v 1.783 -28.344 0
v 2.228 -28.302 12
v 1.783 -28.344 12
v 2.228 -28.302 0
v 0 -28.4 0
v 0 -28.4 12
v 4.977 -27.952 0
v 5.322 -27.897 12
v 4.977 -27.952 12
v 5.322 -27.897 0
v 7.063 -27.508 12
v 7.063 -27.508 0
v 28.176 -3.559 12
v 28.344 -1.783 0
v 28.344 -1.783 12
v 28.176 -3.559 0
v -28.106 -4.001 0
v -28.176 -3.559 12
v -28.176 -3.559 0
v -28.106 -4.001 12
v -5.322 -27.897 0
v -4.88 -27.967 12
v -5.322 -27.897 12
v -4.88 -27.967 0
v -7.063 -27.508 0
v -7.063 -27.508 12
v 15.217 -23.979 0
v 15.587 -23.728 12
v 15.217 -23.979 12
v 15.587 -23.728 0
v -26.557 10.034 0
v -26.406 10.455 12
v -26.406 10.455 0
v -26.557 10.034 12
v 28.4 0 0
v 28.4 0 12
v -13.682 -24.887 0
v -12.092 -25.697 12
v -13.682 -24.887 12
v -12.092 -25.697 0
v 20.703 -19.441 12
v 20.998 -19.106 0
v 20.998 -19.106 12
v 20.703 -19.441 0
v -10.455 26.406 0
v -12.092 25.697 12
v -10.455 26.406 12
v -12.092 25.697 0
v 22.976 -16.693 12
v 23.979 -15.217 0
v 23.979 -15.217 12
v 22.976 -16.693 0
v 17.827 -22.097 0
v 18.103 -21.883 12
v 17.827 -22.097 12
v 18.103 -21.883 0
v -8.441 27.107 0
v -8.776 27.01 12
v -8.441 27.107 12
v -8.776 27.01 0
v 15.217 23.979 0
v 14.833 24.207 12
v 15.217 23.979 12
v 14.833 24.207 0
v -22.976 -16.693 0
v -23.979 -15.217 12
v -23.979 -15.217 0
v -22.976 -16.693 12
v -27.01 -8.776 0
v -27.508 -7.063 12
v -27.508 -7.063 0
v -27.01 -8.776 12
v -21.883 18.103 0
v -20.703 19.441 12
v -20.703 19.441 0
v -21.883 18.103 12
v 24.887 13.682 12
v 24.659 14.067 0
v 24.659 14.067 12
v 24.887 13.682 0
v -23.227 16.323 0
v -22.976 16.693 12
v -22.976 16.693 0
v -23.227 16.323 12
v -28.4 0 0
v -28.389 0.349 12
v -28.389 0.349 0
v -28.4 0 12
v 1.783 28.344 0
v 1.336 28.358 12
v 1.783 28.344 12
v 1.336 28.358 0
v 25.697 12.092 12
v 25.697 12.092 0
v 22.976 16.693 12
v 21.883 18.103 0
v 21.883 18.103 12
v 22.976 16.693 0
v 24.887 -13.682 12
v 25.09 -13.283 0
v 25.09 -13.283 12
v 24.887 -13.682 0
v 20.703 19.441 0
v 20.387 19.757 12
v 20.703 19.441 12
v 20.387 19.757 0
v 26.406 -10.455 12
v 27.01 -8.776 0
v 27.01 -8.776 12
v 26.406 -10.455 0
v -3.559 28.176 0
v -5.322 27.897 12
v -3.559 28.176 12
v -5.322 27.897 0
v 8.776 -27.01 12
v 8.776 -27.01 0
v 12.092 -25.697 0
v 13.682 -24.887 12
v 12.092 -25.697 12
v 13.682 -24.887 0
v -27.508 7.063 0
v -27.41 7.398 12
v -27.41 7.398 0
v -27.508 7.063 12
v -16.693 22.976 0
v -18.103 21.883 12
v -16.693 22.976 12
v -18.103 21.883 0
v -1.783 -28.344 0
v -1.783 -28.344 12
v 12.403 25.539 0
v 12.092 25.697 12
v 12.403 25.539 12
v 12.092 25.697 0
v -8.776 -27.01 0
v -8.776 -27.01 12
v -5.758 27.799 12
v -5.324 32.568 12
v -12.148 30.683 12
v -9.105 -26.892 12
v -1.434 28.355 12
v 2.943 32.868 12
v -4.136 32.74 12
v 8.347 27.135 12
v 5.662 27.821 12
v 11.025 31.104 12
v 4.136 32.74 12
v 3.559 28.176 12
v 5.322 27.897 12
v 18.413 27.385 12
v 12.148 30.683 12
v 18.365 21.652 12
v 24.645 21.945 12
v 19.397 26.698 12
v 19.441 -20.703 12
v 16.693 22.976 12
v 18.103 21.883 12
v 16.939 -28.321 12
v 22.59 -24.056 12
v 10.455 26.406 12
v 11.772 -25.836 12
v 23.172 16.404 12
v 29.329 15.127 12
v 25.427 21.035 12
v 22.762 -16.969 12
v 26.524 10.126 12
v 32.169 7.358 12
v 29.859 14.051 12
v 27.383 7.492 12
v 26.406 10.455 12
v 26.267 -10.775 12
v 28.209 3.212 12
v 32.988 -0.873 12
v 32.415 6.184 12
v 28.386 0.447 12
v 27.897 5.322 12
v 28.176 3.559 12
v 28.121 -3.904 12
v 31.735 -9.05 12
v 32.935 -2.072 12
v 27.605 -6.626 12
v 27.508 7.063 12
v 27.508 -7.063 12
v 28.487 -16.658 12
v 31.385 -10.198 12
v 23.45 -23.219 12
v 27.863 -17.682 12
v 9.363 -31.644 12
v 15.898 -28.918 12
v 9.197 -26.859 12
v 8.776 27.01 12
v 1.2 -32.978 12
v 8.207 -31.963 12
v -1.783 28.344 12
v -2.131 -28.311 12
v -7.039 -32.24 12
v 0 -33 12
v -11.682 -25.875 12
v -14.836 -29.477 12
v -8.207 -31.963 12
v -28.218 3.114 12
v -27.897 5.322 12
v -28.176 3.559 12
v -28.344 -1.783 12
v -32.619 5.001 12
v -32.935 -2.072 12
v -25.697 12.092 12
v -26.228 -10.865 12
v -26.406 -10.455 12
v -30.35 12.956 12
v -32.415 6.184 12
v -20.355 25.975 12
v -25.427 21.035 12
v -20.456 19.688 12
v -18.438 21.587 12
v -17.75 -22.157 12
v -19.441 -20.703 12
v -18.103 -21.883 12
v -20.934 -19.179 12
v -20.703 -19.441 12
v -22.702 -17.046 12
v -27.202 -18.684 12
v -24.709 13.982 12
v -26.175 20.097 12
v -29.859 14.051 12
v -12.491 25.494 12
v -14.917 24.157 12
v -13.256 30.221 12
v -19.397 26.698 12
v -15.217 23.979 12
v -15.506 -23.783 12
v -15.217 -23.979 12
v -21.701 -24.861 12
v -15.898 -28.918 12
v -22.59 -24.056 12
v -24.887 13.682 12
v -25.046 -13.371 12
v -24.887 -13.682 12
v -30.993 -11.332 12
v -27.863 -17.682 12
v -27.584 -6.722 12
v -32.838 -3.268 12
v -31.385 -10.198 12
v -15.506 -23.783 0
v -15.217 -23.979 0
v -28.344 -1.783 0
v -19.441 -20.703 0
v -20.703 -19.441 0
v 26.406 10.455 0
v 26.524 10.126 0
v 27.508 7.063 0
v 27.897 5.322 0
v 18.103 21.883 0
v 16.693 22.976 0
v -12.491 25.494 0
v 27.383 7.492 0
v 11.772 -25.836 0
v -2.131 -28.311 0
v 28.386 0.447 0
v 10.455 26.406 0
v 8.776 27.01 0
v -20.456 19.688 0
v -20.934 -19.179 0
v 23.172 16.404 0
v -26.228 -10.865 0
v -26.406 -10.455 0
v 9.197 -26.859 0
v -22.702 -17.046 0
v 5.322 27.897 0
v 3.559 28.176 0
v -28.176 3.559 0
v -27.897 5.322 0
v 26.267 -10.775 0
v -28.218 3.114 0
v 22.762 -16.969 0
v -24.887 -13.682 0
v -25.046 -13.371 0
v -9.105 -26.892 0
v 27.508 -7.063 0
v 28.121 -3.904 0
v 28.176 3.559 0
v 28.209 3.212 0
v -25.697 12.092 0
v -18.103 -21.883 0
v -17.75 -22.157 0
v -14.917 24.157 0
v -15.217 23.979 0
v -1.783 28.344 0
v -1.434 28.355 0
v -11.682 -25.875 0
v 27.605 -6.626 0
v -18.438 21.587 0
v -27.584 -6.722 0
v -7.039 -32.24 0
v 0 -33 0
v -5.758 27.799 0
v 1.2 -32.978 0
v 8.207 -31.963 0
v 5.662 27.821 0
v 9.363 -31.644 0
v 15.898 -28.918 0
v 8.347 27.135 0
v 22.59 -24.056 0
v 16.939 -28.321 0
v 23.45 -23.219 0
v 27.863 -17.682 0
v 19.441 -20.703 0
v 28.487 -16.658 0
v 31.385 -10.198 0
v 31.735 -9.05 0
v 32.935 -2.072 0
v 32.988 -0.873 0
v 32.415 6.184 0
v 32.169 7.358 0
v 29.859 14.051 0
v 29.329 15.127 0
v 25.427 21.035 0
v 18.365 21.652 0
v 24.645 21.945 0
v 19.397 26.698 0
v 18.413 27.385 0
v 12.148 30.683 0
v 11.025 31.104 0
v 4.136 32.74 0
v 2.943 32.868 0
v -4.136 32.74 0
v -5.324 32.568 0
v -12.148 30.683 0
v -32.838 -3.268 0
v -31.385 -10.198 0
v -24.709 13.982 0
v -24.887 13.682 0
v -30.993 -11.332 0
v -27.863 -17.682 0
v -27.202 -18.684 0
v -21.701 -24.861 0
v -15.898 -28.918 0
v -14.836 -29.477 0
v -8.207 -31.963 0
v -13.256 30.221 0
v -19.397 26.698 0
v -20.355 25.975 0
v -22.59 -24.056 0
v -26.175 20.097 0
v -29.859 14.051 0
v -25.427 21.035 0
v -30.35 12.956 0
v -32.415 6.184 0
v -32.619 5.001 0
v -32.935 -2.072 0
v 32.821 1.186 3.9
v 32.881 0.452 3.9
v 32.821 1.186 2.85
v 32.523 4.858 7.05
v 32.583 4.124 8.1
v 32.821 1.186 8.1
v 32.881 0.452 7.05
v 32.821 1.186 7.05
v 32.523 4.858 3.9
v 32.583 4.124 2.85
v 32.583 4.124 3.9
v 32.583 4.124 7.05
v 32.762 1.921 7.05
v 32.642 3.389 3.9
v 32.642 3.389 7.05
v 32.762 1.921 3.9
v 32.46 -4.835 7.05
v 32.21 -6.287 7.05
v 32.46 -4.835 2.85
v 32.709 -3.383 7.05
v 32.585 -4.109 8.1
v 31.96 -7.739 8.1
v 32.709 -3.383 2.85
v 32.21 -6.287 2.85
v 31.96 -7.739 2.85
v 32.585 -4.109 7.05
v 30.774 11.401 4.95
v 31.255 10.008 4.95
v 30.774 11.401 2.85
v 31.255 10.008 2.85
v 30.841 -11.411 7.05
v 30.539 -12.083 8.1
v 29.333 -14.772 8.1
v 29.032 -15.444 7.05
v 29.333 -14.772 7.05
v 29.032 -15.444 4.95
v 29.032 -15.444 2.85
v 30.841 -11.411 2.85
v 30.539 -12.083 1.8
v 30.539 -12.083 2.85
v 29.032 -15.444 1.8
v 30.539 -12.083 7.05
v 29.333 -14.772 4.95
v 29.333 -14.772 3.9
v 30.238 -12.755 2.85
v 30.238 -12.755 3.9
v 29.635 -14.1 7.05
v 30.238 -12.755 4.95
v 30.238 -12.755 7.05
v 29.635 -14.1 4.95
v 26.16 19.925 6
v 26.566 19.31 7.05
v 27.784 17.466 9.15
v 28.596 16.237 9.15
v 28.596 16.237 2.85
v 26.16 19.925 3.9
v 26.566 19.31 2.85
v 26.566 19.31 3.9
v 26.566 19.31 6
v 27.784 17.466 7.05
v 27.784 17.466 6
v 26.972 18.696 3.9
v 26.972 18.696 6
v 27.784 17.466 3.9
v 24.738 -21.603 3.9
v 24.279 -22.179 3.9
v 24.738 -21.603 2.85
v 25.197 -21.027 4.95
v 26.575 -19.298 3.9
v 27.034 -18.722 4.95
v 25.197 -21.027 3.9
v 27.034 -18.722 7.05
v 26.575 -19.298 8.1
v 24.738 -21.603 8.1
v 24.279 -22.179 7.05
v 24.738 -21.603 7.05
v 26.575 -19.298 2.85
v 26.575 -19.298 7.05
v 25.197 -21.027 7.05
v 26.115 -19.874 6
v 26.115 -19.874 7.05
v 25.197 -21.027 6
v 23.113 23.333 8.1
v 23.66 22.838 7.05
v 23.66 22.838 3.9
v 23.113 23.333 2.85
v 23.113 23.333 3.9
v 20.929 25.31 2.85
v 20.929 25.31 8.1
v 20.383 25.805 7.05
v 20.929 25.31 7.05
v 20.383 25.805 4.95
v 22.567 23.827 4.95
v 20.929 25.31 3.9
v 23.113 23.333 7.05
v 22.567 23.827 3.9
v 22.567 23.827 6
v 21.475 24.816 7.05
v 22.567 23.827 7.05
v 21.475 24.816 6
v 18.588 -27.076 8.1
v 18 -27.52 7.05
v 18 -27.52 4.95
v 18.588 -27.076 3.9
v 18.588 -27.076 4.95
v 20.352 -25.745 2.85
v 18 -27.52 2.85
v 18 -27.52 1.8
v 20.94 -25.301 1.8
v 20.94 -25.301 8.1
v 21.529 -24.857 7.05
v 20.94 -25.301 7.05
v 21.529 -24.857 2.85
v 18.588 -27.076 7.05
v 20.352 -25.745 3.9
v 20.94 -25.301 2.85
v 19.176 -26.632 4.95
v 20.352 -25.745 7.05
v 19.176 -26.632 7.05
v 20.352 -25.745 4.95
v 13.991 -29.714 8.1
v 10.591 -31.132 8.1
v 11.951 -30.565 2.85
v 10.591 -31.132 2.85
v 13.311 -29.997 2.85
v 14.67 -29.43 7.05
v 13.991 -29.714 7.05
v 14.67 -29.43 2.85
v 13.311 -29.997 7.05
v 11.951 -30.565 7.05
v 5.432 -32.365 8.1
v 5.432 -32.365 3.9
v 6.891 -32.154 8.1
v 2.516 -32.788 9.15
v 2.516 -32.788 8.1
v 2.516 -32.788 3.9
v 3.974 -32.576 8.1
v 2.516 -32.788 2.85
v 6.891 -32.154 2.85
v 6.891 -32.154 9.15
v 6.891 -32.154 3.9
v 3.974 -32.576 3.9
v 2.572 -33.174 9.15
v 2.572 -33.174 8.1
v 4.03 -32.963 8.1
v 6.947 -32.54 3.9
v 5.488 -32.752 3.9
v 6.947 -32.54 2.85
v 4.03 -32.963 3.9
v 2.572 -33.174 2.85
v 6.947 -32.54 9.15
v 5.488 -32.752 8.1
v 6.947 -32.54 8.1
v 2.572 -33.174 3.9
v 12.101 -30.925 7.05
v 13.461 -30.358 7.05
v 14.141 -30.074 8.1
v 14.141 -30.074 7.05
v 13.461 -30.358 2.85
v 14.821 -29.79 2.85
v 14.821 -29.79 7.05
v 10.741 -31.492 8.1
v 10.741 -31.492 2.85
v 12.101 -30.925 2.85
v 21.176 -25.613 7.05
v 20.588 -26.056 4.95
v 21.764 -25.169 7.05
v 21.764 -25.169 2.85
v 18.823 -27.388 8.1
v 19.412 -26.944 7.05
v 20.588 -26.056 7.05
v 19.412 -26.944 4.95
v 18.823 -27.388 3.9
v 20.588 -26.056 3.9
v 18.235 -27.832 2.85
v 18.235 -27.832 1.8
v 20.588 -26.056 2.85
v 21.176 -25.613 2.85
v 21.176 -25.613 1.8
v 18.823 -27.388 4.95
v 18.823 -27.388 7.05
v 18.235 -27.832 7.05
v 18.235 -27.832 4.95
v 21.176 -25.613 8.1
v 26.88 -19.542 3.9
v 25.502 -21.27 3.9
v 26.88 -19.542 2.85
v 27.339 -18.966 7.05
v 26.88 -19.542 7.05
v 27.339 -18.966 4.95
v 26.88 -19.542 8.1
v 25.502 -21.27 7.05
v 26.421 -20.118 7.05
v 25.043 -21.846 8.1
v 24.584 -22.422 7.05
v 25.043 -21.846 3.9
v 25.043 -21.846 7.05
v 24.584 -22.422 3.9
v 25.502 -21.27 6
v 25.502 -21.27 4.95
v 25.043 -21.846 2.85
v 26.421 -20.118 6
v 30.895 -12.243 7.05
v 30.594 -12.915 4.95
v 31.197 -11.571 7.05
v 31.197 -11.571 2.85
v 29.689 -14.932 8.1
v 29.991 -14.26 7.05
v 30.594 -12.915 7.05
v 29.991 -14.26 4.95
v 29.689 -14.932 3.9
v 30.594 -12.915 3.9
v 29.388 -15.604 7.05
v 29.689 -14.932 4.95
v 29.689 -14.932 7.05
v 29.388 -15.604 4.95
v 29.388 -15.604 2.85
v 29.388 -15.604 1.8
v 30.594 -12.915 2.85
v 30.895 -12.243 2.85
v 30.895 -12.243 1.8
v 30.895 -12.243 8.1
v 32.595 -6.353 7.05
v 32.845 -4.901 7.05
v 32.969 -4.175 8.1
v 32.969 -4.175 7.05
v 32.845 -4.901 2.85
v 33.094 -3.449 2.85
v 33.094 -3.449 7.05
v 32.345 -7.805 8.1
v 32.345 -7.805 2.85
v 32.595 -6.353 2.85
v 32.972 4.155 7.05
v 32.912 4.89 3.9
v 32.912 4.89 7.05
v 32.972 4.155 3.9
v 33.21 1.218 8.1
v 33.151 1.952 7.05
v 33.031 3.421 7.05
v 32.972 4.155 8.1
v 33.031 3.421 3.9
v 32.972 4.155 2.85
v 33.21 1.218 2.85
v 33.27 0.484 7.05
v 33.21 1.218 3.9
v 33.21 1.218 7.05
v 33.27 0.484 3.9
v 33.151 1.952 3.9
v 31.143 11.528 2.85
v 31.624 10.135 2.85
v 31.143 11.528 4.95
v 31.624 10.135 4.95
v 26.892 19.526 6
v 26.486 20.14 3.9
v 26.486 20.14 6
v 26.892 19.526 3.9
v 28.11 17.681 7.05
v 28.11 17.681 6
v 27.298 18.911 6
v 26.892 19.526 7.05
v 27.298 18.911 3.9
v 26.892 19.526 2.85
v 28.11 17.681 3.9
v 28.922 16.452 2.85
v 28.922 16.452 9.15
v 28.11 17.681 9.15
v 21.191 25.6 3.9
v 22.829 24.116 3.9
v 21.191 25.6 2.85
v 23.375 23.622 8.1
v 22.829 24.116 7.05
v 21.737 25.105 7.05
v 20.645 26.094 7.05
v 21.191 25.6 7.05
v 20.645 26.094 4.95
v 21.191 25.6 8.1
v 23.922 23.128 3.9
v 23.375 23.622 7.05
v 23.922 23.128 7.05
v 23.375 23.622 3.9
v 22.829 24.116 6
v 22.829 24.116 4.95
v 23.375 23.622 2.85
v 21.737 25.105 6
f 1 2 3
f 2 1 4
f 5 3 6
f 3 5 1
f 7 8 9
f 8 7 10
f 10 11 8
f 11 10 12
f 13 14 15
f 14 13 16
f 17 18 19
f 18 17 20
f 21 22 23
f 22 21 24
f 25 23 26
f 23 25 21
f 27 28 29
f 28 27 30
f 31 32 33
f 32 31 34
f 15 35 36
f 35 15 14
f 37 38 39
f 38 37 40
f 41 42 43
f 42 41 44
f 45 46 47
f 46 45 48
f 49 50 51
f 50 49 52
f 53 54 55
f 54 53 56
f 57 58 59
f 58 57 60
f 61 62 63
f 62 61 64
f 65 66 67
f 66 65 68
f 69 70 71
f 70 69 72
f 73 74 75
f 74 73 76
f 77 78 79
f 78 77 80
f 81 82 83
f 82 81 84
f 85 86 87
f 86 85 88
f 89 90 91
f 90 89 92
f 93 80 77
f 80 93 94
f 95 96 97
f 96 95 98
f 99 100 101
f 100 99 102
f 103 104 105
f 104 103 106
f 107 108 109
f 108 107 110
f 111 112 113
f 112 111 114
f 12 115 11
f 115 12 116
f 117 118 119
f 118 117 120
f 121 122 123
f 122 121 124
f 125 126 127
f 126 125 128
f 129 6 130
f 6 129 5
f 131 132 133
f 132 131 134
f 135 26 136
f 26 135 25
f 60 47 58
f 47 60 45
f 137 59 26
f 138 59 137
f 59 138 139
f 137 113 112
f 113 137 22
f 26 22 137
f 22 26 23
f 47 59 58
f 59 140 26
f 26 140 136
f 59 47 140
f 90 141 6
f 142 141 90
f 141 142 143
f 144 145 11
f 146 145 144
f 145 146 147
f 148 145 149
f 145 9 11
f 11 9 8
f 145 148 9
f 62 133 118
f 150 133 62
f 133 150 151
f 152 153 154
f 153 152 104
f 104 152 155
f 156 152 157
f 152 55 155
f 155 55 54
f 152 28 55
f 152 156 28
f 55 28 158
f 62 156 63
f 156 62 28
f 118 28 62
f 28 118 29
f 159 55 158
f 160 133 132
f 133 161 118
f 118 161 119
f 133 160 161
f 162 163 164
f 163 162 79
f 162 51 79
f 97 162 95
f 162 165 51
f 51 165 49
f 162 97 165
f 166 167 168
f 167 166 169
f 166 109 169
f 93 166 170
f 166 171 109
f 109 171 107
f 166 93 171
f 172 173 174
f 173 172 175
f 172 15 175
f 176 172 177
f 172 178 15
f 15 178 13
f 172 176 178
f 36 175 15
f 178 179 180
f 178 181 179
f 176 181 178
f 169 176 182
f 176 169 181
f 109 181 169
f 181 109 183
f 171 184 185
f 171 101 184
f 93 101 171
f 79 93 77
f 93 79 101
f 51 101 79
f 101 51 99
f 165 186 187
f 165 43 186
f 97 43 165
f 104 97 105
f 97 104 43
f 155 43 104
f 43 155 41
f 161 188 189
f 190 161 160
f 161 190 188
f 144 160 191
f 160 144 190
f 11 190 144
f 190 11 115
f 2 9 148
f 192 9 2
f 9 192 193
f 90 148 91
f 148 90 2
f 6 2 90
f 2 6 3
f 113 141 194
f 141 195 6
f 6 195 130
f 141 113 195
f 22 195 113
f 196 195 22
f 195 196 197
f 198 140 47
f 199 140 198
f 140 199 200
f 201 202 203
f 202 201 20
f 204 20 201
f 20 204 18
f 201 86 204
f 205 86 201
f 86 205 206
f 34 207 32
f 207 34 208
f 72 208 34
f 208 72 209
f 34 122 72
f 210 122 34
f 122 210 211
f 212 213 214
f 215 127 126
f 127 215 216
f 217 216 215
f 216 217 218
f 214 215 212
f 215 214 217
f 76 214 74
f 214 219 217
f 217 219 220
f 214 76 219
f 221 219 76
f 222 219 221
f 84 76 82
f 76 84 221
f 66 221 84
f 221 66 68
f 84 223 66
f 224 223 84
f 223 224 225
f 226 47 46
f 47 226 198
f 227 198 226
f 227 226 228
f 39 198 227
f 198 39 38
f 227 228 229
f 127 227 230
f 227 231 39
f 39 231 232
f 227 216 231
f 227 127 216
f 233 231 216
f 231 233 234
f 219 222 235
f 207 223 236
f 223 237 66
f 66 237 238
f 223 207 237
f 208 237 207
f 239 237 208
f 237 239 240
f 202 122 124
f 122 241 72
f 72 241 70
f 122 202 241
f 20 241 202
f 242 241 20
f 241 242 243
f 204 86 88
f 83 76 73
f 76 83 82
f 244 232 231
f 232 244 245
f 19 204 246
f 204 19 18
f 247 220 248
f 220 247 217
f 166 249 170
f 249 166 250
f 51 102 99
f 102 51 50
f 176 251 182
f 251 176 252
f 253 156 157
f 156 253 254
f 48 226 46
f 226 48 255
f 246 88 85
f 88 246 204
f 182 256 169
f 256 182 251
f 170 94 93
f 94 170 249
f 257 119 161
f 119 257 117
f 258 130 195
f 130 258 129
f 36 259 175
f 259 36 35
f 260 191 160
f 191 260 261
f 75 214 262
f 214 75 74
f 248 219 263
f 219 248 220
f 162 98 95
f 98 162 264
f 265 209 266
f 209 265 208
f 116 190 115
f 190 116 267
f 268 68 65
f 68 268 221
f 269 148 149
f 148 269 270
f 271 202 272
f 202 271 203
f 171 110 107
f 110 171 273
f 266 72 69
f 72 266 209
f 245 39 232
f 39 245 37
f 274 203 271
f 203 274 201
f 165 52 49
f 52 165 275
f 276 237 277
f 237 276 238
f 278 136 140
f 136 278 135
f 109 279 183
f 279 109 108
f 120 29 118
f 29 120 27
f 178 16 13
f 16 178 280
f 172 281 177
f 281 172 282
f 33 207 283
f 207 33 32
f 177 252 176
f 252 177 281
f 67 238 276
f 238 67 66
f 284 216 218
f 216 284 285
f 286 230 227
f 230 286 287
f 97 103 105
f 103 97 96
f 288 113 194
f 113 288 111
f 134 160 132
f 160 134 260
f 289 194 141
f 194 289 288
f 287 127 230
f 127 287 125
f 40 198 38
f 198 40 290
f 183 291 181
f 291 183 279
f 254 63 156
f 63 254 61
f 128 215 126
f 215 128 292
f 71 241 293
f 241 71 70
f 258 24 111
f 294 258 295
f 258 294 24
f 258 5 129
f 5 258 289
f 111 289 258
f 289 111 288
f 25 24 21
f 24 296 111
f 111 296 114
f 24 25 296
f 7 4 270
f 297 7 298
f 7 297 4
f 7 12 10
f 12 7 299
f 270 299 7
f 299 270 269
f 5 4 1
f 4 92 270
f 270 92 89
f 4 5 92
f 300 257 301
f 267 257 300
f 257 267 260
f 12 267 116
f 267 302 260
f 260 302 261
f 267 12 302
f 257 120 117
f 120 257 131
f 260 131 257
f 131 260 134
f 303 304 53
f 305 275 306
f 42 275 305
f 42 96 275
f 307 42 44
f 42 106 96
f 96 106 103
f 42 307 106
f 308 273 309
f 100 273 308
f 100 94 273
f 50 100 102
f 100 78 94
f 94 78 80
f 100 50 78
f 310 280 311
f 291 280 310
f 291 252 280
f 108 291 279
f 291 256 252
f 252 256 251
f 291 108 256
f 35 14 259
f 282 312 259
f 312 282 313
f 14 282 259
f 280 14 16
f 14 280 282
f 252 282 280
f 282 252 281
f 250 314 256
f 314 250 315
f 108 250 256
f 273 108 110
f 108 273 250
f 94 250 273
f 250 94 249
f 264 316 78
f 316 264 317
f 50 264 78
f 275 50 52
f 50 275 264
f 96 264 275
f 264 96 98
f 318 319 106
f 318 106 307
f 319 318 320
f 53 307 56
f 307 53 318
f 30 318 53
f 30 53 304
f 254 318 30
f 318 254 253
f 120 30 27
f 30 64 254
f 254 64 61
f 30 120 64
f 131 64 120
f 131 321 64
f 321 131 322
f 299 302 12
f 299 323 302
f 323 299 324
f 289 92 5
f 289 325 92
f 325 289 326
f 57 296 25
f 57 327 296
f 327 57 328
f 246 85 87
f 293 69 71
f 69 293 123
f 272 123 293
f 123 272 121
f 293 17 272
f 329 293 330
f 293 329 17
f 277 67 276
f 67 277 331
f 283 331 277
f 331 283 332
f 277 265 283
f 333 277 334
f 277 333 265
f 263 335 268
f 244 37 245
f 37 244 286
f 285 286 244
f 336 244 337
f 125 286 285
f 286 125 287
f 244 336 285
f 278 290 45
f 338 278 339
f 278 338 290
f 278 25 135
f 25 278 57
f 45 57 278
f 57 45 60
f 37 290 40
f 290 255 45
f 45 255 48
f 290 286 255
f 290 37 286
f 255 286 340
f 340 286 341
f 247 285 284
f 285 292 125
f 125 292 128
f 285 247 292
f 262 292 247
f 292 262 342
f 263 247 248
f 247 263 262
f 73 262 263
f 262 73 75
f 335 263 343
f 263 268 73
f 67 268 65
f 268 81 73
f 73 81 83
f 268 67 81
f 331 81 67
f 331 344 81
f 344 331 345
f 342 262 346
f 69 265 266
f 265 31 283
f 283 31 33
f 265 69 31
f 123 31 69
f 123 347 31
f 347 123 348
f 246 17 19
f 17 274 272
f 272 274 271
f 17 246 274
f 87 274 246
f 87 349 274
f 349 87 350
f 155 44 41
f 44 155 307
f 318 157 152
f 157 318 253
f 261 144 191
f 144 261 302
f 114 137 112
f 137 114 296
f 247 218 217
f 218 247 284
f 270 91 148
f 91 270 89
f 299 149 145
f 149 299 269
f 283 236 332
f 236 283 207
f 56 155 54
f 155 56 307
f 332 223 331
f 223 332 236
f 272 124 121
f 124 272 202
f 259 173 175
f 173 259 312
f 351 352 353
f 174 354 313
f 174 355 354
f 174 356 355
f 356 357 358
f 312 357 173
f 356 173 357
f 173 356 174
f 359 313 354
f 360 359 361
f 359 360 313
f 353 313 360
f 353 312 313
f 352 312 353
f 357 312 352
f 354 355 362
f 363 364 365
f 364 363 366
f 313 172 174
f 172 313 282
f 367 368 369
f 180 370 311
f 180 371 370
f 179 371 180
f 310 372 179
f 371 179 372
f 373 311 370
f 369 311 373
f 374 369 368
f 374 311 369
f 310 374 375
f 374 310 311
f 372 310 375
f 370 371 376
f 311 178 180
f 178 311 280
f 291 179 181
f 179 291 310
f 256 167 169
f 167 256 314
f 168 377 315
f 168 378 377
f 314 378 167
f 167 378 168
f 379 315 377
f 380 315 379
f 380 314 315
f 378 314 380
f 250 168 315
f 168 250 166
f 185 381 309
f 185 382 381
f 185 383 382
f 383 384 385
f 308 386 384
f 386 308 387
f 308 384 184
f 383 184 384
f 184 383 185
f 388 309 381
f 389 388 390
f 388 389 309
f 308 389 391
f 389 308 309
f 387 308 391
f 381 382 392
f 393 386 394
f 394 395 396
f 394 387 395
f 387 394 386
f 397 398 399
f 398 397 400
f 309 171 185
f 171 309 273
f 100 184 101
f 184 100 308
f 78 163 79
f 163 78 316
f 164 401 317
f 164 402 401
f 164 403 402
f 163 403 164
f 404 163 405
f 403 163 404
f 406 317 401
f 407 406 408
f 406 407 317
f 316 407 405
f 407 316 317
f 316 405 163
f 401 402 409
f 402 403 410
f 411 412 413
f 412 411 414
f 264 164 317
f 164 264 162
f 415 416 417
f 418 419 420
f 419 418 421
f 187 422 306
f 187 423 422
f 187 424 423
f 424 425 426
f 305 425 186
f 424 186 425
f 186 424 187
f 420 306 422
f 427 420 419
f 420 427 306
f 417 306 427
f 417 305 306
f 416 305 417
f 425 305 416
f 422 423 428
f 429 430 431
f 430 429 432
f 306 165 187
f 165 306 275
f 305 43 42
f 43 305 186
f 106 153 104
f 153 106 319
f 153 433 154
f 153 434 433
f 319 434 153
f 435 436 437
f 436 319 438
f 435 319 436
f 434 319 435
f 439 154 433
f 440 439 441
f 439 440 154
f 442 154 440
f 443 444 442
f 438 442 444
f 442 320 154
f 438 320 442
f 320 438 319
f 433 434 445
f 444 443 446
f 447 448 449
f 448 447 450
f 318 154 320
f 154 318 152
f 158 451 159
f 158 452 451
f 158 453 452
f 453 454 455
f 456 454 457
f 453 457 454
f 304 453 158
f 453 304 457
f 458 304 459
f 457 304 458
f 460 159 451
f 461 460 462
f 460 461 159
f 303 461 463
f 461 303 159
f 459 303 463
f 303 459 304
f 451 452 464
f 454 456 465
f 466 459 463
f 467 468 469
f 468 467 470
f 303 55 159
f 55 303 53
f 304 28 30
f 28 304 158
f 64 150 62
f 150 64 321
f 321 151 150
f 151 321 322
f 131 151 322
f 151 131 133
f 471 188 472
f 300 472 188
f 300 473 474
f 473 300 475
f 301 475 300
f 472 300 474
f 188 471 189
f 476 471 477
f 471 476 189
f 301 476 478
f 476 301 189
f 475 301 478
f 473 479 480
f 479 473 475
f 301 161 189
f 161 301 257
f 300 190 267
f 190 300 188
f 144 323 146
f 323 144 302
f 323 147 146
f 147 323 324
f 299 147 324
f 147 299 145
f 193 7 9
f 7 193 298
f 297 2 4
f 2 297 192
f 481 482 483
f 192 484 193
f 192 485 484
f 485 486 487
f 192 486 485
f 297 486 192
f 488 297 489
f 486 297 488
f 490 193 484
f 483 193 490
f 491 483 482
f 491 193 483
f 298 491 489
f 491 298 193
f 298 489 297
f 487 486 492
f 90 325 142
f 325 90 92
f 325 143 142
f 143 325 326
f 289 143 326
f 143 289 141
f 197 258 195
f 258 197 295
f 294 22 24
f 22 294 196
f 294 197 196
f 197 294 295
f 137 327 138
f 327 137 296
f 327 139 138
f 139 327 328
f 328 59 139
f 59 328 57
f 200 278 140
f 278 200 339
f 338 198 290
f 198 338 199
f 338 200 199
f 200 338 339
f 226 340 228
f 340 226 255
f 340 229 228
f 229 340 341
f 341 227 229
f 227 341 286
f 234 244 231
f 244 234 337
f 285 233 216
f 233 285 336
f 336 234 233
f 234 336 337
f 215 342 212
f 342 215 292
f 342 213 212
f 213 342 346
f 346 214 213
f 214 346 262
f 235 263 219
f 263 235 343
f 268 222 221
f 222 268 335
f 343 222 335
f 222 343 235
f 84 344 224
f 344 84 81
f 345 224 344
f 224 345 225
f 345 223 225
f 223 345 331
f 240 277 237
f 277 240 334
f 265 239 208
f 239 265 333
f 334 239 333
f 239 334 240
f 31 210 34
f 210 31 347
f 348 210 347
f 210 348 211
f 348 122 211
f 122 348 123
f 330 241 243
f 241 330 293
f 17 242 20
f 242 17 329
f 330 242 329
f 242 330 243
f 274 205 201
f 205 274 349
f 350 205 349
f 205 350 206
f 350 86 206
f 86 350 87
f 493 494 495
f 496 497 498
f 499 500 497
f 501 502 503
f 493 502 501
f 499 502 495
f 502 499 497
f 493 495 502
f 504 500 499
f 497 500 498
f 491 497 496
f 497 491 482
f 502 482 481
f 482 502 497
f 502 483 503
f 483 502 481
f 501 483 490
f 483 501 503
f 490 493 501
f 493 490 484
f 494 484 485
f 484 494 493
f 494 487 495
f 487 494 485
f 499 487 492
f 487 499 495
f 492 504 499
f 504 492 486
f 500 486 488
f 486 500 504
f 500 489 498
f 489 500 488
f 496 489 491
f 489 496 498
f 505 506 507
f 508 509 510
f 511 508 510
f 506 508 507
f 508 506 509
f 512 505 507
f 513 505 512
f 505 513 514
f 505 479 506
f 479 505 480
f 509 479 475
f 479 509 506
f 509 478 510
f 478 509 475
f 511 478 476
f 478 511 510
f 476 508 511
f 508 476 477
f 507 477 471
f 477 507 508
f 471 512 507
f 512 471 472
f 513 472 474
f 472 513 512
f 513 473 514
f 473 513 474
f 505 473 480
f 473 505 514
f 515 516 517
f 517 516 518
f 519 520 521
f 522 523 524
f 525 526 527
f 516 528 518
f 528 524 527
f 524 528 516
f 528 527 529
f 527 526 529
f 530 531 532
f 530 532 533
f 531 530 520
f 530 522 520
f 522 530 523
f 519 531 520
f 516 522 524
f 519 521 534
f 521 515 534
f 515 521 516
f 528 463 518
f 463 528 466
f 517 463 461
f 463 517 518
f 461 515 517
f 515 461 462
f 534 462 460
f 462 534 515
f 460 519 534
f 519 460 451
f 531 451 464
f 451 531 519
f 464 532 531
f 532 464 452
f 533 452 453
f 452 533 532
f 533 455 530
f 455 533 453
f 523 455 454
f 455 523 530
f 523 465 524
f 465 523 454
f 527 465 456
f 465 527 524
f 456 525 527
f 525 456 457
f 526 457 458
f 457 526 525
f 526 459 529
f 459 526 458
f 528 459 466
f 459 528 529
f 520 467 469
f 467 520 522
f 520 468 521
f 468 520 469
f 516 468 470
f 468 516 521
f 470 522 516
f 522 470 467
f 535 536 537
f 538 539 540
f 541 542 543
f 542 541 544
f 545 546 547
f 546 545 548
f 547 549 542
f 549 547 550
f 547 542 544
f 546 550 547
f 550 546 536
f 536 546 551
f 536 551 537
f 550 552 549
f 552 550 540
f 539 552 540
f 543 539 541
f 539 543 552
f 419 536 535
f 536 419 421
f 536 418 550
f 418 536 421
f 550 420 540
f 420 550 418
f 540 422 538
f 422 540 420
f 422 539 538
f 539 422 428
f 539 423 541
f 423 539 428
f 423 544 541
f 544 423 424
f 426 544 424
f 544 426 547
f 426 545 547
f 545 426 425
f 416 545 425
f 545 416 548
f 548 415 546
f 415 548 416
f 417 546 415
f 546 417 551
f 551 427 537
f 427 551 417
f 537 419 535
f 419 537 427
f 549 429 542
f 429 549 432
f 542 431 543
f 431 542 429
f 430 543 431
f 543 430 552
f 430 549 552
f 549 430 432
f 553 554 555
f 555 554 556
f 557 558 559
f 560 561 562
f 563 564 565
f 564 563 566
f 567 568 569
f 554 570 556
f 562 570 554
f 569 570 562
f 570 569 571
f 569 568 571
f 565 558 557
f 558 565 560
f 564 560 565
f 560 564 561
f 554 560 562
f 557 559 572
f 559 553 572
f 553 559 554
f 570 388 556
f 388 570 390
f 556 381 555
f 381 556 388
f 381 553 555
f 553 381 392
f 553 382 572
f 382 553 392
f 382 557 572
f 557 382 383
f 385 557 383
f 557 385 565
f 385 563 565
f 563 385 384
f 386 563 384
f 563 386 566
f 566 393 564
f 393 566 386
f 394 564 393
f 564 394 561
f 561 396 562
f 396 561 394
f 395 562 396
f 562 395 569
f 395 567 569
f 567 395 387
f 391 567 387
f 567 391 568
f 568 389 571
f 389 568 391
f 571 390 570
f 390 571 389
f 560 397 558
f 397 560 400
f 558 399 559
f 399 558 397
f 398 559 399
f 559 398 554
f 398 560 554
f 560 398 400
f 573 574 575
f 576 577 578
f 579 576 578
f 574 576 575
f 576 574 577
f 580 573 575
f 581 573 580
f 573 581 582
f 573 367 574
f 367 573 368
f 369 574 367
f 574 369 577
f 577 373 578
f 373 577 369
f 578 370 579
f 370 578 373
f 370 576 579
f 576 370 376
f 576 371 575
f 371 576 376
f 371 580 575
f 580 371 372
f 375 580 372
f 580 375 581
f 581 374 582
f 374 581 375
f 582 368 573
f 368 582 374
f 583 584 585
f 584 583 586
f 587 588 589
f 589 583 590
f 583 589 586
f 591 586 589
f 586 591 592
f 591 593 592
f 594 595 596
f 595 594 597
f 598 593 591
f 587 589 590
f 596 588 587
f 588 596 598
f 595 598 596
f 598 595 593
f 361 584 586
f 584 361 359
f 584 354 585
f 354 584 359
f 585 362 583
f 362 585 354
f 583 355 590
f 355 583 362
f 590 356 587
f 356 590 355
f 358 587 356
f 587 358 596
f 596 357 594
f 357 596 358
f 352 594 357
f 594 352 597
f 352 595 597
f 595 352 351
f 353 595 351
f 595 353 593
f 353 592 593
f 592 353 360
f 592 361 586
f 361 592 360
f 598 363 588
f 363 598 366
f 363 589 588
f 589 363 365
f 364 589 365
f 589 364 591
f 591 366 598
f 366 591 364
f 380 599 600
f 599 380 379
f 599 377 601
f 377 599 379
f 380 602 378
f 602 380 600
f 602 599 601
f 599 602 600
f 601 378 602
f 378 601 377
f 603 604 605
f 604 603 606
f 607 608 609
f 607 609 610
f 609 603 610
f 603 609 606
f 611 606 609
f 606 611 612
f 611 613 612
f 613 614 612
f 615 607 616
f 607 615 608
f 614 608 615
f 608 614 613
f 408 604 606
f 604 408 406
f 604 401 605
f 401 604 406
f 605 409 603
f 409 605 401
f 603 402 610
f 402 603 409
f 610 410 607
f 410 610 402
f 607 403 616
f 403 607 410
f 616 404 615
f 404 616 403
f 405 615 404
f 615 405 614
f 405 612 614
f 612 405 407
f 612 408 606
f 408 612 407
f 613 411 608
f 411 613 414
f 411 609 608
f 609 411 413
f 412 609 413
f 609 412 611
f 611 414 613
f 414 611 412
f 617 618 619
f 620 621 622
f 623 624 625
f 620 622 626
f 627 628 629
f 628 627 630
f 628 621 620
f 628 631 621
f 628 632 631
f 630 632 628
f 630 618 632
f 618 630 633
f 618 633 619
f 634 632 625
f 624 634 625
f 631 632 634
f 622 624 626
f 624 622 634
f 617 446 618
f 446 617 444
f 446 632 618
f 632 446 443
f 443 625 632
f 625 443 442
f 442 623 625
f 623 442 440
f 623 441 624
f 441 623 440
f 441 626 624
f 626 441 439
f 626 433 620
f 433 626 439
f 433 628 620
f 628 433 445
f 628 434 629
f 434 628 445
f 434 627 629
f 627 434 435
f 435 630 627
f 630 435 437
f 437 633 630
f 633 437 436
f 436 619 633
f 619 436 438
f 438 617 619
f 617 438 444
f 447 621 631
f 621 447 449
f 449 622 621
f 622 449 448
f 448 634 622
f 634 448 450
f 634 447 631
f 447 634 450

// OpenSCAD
//inner radius of the bracelet in mm
inner_radius = 28; //[15:150]

//outer radius of the bracelet in mm
outer_radius = 33; //[15:150]

//length (=height) of the bracelet in mm
length = 12;  // [5:60]

//diameter of your 3d printer nozzle in mm. The gaps will be multiples of this
nozzle = 0.4; 

//gap inside factor. Increase to avoid touching links at inside
gapinfactor = 6; //[2:8]

//number of sections on bracelets
sections = 25; //[15:60]

//text to put on bracelet
text = "Ingegno.be";

//view text as holes?
holes = "no"; // [yes, no]

//text thickness as amount of nozzle. Don't set high as top part will not be filled with fill=0!
text_thickness = 2;  //[2:6]

use <MCAD/fonts.scad>

module test(){
  echo("test");
}

baseheight = 0.8;
r1 = inner_radius;
r2 = outer_radius;
n = sections;
gapin=gapinfactor*nozzle;
gapout = 3*nozzle;
alpha = 2*PI/sections;
alpha_1 = alpha - gapin/r1;
beta = 2*PI/sections;
beta_1 = alpha - gapout/r2;
alpha_2 = gapin/r1;
beta_2 = gapout/r2;
alpha_3 = nozzle/r1;
beta_3 = nozzle/r2;

fudge = 0.01;

//process the text, we have beta_1 for the symbol, use beta_2 for border!
thisFont=8bit_polyfont();
x_shift=thisFont[0][0];
y_shift=thisFont[0][1];
theseIndicies=search(text,thisFont[2],1,1);
wordlength = (len(theseIndicies));

factorygap = 3;
scale_x = (beta_1-beta_2) * r2 / x_shift;
scale_y = (length - factorygap*gapout) / y_shift;
thicknessword = text_thickness * nozzle;

// Create the Text
module alltext() {
    for( j=[0:(len(theseIndicies)-1)] ) 
      rotate([0, 0, (3/2*beta_2 + (beta_1-beta_2)/2 + j* beta)*180/PI]) 
      translate([r2 -1.5* nozzle, -(beta_1-beta_2) * r2 /2 , factorygap/2*gapout])
      rotate([90,0,90]) 
        {
        scale([scale_x,scale_y,1]){
          linear_extrude(height=thicknessword) 
            polygon(points=thisFont[2][theseIndicies[j]][6][0],paths=thisFont[2][theseIndicies[j]][6][1]);
        }
      }
}

module innerholes() {
  union() {
    for (i = [0:n-1]){
      rotate([0,0,(-alpha_1/2 + i* alpha)*180/PI])
        translate([r1,0,0]) 
          cube(size=[3*nozzle,r1*(alpha_2+alpha_3), 3*length], center=true);
    }
  }
}

module spikes() {
  linear_extrude(height=length) { union(){
    for (i = [0:n-1]){
      polygon(points = [ [r1*cos((-alpha_1/2 + i* alpha-alpha_2)*180/PI), 
                          r1*sin((-alpha_1/2 + i* alpha-alpha_2)*180/PI)], 
                         [r2*cos((2*beta_2/2 + (i-1)* beta)*180/PI), 
                          r2*sin((2*beta_2/2 + (i-1)* beta)*180/PI)], 
                         [r2*cos(( (i)* beta)*180/PI), 
                          r2*sin(( (i)* beta)*180/PI)], 
                         [r1*cos((-alpha_1/2 + i* alpha)*180/PI), 
                          r1*sin((-alpha_1/2 + i* alpha)*180/PI)]
                         ], 
                   paths = [ [0,1,2,3]]);
    }
  }}
}

module outerholes() {
  union() {
    for (i = [0:n-1]){
      rotate([0,0,(beta_2/2 + i* beta)*180/PI])
        translate([r2-nozzle,0,0]) 
          cube(size=[3*nozzle, gapout, 3*length], center=true);
    }
  }
}

module outercirc(){
  difference(){
    cylinder(h=length, r=r2, $fn=100);
    translate([0,0,-fudge]) cylinder(h=length+2*fudge, r=r2-nozzle, $fn=100);
    outerholes();
  }
}

module innercirc(){
  //difference(){
    cylinder(h=length, r=r1+nozzle, $fn=100);
  //  translate([0,0,-fudge]) cylinder(h=length+2*fudge, r=r1, $fn=100);
  //  innerholes();
  //}
}

module baseform(){
  union(){
    //outercirc();
    innercirc();
    spikes();
  }
}

rotate([0,0,-90])
if (holes == "yes") {
  difference(){
  baseform();
  alltext();
  }
} else {
  union(){
    baseform();
    alltext();
  }
}
